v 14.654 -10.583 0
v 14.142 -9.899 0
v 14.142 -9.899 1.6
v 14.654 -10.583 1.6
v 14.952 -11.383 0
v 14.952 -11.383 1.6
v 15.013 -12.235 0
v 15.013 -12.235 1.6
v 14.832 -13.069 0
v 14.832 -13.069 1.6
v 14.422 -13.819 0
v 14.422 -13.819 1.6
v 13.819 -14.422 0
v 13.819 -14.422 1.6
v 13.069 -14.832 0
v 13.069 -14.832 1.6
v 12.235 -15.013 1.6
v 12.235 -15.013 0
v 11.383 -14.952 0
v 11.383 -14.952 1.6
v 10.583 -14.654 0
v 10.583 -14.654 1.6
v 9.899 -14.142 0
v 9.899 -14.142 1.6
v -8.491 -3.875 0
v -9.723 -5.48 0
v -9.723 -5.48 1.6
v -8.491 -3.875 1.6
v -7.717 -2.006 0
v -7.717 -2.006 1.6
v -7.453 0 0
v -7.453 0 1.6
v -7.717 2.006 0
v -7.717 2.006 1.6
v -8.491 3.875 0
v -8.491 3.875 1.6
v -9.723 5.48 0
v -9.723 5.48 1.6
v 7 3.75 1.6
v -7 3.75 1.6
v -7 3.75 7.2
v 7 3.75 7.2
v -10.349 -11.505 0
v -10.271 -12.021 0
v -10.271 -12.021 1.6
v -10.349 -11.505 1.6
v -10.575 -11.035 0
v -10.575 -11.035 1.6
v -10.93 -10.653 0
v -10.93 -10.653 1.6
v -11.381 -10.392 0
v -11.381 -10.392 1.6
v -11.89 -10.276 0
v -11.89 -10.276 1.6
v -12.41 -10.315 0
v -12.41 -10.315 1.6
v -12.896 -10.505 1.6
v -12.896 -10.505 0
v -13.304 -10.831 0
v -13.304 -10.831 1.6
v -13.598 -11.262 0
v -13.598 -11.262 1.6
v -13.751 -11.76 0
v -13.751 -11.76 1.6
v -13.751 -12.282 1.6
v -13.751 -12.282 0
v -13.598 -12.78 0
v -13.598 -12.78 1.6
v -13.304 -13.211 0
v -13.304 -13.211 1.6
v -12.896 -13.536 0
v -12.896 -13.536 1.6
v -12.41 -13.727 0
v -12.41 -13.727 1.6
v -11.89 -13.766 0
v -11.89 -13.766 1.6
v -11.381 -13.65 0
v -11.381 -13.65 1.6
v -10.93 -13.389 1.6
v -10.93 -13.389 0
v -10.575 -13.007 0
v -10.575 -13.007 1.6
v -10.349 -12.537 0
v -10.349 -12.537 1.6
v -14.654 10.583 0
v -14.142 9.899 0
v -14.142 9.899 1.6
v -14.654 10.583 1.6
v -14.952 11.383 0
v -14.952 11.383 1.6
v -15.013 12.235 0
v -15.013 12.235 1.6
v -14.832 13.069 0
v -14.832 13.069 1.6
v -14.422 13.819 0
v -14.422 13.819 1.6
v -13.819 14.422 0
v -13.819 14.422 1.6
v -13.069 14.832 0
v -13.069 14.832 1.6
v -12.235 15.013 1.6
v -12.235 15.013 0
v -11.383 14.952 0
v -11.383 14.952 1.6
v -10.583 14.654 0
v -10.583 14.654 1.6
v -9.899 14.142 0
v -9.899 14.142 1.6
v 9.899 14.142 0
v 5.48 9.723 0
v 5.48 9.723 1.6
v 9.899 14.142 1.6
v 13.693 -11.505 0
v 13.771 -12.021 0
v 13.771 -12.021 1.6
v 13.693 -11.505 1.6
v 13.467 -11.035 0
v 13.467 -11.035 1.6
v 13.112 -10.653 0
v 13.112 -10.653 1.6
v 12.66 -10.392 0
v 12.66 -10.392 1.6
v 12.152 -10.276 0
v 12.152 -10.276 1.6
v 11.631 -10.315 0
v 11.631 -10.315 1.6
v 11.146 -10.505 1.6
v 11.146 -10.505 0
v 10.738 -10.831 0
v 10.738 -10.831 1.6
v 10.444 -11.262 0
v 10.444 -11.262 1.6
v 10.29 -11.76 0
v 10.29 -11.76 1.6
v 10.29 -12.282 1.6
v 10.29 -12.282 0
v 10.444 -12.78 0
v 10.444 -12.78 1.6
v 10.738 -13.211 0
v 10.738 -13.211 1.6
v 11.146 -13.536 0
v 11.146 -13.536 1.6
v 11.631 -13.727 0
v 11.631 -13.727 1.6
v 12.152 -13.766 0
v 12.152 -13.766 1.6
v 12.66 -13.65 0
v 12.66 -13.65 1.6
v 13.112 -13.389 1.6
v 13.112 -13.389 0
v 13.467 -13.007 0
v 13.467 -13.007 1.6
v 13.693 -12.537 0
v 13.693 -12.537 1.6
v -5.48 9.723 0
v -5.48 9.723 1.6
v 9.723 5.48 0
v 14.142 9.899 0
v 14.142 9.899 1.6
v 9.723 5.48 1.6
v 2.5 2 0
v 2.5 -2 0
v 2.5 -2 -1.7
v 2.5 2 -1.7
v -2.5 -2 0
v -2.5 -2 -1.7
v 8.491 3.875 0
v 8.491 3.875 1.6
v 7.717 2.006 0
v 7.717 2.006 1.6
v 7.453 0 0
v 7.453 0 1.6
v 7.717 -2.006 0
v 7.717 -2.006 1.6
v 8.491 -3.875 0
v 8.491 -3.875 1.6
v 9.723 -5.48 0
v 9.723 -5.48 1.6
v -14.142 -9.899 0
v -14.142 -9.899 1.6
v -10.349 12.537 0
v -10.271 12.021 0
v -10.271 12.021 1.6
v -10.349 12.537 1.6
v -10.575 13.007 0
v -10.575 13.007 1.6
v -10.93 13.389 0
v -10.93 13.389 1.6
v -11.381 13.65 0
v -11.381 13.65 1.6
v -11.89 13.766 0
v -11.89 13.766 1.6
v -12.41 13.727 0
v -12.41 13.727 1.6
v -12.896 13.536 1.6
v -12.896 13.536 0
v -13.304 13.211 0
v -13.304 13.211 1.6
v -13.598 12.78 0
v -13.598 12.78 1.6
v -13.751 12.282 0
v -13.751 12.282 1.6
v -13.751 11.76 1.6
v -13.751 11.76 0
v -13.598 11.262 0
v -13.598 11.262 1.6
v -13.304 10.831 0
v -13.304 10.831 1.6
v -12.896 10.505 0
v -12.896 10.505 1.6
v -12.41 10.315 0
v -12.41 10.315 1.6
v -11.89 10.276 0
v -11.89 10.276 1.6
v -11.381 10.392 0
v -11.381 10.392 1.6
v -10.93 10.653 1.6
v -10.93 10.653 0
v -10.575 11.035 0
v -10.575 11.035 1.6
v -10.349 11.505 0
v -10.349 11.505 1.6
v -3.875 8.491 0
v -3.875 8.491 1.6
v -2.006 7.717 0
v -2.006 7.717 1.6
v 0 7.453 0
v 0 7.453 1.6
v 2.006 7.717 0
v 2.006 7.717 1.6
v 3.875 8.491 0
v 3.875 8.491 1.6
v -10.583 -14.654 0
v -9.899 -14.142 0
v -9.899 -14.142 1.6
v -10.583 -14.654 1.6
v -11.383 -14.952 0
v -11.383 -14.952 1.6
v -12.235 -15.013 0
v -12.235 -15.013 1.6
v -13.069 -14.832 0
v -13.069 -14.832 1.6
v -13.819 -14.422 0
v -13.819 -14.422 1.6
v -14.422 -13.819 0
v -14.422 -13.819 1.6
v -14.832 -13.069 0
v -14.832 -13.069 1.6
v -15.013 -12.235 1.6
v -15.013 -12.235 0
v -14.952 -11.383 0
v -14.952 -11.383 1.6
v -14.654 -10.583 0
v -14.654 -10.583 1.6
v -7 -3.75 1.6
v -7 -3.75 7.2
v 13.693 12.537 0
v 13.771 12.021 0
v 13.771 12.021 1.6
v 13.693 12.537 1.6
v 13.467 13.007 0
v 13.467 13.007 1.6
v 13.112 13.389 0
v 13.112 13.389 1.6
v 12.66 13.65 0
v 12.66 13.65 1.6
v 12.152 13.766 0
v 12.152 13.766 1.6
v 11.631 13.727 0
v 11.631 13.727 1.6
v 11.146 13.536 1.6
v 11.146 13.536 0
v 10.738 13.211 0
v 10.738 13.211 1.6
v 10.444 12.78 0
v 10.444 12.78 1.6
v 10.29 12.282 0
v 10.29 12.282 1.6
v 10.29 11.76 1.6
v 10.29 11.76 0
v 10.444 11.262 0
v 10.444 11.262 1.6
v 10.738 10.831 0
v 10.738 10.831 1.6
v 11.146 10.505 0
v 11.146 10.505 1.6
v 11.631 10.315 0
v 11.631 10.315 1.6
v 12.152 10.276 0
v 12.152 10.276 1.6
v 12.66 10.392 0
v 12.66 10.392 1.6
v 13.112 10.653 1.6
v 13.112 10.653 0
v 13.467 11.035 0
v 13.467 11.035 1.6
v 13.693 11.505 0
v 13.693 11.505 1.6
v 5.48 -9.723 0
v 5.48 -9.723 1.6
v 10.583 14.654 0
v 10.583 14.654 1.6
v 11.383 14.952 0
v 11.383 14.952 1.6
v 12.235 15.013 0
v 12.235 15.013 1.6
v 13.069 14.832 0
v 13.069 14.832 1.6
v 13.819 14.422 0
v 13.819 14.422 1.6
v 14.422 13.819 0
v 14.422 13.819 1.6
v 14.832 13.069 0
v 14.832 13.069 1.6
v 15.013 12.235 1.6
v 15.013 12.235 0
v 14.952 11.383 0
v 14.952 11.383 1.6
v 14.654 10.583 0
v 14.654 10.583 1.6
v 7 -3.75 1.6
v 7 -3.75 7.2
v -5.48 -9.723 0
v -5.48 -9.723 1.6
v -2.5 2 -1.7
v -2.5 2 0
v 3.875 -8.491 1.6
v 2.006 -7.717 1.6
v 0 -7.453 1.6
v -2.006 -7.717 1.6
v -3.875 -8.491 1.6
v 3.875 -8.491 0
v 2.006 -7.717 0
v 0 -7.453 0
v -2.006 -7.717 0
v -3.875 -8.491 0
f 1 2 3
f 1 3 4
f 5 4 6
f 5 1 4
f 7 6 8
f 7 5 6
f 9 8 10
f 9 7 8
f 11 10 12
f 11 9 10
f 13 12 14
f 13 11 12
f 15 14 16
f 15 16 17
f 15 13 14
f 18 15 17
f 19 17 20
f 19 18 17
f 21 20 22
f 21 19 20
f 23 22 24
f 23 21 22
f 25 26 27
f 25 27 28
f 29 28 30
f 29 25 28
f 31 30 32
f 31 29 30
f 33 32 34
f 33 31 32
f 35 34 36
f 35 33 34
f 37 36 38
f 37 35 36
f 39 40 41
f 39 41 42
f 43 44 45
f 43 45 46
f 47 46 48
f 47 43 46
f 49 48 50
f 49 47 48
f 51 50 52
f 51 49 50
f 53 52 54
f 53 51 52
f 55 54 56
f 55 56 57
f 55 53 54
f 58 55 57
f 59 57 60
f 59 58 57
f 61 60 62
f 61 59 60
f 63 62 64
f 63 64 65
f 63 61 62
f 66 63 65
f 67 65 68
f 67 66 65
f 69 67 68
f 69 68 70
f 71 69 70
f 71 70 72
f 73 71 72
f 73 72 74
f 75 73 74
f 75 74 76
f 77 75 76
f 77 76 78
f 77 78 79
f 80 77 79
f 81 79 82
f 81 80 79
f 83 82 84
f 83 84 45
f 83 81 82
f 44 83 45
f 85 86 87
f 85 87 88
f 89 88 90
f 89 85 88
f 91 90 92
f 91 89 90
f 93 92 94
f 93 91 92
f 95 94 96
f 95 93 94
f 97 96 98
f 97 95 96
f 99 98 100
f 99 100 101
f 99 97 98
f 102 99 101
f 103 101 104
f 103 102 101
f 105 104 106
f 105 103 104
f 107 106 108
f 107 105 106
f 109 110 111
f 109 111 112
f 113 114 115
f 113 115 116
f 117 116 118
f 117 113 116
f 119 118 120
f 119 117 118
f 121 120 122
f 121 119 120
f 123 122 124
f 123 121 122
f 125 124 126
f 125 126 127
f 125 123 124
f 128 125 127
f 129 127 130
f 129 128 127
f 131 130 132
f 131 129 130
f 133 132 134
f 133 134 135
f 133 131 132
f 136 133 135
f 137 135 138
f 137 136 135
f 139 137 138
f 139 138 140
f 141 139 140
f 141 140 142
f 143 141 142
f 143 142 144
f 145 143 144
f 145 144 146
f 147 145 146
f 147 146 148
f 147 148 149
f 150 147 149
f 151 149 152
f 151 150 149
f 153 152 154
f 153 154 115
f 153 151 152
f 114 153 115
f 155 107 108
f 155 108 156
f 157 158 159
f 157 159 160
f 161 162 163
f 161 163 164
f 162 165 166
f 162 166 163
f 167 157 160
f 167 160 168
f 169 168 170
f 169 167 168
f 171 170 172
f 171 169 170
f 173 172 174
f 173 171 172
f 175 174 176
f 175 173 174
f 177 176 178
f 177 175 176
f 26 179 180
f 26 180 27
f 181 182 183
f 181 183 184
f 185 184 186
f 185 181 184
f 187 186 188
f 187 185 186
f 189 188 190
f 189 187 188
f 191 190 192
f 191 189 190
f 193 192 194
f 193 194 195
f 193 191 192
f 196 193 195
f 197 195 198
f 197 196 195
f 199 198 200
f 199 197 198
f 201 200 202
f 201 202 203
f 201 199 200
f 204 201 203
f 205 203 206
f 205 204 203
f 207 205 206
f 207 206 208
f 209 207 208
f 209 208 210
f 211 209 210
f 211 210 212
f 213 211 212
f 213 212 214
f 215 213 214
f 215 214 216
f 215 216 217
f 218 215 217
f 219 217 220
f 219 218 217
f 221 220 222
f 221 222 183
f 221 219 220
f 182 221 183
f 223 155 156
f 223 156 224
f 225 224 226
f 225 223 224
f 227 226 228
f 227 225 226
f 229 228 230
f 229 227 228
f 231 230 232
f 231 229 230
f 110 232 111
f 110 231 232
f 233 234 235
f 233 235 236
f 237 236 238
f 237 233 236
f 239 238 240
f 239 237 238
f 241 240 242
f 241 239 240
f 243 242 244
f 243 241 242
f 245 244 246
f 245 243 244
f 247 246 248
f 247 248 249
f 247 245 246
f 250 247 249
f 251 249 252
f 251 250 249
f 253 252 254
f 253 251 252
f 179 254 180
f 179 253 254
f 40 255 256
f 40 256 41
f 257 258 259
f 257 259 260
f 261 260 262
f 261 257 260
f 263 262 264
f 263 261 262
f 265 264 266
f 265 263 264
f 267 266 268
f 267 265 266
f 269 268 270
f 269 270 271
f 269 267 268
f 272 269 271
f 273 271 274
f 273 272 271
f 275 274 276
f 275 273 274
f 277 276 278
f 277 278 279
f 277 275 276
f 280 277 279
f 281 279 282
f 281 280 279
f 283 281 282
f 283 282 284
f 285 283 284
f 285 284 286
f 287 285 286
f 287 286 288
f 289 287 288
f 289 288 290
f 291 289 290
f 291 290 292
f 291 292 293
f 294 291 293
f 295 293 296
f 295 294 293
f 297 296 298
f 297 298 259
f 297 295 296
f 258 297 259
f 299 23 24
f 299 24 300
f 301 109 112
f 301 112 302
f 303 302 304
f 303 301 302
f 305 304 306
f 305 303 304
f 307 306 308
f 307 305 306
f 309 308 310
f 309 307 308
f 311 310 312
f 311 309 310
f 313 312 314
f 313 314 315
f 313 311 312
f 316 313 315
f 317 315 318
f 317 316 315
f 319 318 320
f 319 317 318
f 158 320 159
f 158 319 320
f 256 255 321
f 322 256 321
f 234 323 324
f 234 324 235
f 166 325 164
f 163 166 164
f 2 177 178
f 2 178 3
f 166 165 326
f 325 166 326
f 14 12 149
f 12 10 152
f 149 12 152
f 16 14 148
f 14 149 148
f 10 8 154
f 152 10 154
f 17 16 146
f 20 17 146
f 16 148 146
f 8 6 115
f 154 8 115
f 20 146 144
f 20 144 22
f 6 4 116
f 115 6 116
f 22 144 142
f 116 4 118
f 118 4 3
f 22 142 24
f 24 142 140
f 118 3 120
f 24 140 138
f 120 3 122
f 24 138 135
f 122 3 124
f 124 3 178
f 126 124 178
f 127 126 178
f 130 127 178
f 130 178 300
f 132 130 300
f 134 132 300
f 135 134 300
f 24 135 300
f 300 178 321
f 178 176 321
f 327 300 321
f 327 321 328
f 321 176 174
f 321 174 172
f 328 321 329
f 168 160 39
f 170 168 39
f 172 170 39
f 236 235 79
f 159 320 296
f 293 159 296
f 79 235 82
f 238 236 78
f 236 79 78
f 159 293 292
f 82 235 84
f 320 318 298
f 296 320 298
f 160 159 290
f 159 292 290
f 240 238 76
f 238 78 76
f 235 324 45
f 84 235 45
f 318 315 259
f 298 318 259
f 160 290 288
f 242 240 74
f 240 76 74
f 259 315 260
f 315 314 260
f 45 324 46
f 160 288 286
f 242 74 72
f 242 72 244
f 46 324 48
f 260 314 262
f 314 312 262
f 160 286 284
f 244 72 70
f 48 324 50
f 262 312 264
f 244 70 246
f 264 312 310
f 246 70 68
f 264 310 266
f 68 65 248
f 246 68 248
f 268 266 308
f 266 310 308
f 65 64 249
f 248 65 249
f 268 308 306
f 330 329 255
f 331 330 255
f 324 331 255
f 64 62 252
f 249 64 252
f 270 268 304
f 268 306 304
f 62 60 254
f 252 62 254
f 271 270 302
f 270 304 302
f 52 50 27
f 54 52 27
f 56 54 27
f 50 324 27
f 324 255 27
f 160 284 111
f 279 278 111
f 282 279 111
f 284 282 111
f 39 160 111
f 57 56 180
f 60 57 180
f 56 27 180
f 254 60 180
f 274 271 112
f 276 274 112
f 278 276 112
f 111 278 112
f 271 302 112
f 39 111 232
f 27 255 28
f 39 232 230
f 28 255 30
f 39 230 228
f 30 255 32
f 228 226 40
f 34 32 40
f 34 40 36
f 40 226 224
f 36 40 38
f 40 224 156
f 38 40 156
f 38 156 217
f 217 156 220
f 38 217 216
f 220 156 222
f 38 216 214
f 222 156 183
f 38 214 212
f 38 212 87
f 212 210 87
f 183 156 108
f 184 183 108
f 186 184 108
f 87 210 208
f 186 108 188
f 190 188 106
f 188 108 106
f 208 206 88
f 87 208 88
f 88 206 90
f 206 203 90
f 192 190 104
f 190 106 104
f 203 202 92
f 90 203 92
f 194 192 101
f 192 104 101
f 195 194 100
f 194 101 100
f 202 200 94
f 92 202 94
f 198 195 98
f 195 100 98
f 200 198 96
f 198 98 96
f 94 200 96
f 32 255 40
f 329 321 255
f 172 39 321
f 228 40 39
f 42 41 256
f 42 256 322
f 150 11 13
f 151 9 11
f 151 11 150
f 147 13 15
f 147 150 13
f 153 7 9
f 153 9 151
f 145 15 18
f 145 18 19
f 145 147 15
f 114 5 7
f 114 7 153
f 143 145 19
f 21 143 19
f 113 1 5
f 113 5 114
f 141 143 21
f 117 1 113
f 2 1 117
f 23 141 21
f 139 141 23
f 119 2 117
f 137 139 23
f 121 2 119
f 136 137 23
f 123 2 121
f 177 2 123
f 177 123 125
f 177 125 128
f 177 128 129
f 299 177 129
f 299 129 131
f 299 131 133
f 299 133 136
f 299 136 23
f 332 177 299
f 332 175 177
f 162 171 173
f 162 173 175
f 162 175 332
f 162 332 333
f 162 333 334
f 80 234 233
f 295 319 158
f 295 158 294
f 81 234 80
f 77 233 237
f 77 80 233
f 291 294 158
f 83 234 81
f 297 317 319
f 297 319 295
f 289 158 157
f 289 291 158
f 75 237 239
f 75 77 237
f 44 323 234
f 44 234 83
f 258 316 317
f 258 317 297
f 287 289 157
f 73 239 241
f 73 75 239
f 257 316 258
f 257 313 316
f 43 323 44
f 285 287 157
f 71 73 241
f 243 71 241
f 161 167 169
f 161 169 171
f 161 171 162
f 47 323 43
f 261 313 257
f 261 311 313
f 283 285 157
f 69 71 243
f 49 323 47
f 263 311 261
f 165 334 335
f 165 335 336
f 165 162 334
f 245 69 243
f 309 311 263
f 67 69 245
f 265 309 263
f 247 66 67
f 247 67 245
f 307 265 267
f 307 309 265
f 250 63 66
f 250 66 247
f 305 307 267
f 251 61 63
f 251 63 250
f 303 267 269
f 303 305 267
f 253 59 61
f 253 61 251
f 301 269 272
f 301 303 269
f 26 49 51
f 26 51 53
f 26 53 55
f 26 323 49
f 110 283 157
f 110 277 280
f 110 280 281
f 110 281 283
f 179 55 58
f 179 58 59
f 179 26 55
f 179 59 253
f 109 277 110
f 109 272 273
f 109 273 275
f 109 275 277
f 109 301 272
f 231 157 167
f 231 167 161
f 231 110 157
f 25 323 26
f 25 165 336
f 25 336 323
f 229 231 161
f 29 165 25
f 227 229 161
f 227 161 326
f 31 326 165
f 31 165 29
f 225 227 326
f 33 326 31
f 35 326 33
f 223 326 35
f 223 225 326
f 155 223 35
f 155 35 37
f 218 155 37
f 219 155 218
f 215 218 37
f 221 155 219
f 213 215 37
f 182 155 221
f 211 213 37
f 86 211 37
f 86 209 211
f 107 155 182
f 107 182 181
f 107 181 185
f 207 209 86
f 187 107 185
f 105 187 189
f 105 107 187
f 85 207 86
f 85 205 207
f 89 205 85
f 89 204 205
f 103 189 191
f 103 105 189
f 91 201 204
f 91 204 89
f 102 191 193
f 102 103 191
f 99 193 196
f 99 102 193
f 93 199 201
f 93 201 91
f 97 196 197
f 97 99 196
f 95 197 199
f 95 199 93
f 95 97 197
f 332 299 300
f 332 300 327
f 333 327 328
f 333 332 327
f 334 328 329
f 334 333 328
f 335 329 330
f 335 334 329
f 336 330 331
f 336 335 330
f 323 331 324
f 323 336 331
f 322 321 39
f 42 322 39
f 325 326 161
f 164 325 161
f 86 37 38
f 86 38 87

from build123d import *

# Parameters (mm, degrees)
SKETCH1_R           = 1.75
SKETCH1_W           = 5
SKETCH1_H           = 4
BOSS_EXTRUDE1_DEPTH = 1.6
SKETCH1_3_W         = 14
SKETCH1_3_H         = 7.5
BOSS_EXTRUDE2_DEPTH = 7.2
SKETCH1_5_W         = 5
SKETCH1_5_H         = 4
BOSS_EXTRUDE3_DEPTH = 1.7


with BuildPart() as part:
    # Sketch1 → Boss-Extrude1 (new body)
    with BuildSketch(Plane.XY):
        with BuildLine():
            Line((-14.142135624, 9.899494937), (-9.722718241, 5.480077554))
            ThreePointArc((-9.722718241, 5.480077554), (-7.452795796, 0), (-9.722718241, -5.480077554))
            Line((-9.722718241, -5.480077554), (-14.142135624, -9.899494937))
            ThreePointArc((-14.142135624, -9.899494937), (-14.142135624, -14.142135624), (-9.899494937, -14.142135624))
            Line((-9.899494937, -14.142135624), (-5.480077554, -9.722718241))
            ThreePointArc((-5.480077554, -9.722718241), (0, -7.452795796), (5.480077554, -9.722718241))
            Line((5.480077554, -9.722718241), (9.899494937, -14.142135624))
            ThreePointArc((9.899494937, -14.142135624), (14.142135624, -14.142135624), (14.142135624, -9.899494937))
            Line((14.142135624, -9.899494937), (9.722718241, -5.480077554))
            ThreePointArc((9.722718241, -5.480077554), (7.452795796, 0), (9.722718241, 5.480077554))
            Line((9.722718241, 5.480077554), (14.142135624, 9.899494937))
            ThreePointArc((14.142135624, 9.899494937), (14.142135624, 14.142135624), (9.899494937, 14.142135624))
            Line((9.899494937, 14.142135624), (5.480077554, 9.722718241))
            ThreePointArc((5.480077554, 9.722718241), (0, 7.452795796), (-5.480077554, 9.722718241))
            Line((-5.480077554, 9.722718241), (-9.899494937, 14.142135624))
            ThreePointArc((-9.899494937, 14.142135624), (-14.142135624, 14.142135624), (-14.142135624, 9.899494937))
        make_face()
        with Locations((-12.02081528, -12.02081528)):
            Circle(SKETCH1_R, mode=Mode.SUBTRACT)
        with Locations((12.02081528, -12.02081528)):
            Circle(SKETCH1_R, mode=Mode.SUBTRACT)
        with Locations((-12.02081528, 12.02081528)):
            Circle(SKETCH1_R, mode=Mode.SUBTRACT)
        with Locations((12.02081528, 12.02081528)):
            Circle(SKETCH1_R, mode=Mode.SUBTRACT)
        Rectangle(SKETCH1_W, SKETCH1_H, mode=Mode.SUBTRACT)
    extrude(amount=BOSS_EXTRUDE1_DEPTH)

    # Sketch1<3> → Boss-Extrude2 (add)
    with BuildSketch(Plane.XY):
        Rectangle(SKETCH1_3_W, SKETCH1_3_H)
    extrude(amount=BOSS_EXTRUDE2_DEPTH)

    # Sketch1<5> → Boss-Extrude3 (add)
    with BuildSketch(Plane.XY):
        Rectangle(SKETCH1_5_W, SKETCH1_5_H)
    extrude(amount=-BOSS_EXTRUDE3_DEPTH)


solid = part.part
